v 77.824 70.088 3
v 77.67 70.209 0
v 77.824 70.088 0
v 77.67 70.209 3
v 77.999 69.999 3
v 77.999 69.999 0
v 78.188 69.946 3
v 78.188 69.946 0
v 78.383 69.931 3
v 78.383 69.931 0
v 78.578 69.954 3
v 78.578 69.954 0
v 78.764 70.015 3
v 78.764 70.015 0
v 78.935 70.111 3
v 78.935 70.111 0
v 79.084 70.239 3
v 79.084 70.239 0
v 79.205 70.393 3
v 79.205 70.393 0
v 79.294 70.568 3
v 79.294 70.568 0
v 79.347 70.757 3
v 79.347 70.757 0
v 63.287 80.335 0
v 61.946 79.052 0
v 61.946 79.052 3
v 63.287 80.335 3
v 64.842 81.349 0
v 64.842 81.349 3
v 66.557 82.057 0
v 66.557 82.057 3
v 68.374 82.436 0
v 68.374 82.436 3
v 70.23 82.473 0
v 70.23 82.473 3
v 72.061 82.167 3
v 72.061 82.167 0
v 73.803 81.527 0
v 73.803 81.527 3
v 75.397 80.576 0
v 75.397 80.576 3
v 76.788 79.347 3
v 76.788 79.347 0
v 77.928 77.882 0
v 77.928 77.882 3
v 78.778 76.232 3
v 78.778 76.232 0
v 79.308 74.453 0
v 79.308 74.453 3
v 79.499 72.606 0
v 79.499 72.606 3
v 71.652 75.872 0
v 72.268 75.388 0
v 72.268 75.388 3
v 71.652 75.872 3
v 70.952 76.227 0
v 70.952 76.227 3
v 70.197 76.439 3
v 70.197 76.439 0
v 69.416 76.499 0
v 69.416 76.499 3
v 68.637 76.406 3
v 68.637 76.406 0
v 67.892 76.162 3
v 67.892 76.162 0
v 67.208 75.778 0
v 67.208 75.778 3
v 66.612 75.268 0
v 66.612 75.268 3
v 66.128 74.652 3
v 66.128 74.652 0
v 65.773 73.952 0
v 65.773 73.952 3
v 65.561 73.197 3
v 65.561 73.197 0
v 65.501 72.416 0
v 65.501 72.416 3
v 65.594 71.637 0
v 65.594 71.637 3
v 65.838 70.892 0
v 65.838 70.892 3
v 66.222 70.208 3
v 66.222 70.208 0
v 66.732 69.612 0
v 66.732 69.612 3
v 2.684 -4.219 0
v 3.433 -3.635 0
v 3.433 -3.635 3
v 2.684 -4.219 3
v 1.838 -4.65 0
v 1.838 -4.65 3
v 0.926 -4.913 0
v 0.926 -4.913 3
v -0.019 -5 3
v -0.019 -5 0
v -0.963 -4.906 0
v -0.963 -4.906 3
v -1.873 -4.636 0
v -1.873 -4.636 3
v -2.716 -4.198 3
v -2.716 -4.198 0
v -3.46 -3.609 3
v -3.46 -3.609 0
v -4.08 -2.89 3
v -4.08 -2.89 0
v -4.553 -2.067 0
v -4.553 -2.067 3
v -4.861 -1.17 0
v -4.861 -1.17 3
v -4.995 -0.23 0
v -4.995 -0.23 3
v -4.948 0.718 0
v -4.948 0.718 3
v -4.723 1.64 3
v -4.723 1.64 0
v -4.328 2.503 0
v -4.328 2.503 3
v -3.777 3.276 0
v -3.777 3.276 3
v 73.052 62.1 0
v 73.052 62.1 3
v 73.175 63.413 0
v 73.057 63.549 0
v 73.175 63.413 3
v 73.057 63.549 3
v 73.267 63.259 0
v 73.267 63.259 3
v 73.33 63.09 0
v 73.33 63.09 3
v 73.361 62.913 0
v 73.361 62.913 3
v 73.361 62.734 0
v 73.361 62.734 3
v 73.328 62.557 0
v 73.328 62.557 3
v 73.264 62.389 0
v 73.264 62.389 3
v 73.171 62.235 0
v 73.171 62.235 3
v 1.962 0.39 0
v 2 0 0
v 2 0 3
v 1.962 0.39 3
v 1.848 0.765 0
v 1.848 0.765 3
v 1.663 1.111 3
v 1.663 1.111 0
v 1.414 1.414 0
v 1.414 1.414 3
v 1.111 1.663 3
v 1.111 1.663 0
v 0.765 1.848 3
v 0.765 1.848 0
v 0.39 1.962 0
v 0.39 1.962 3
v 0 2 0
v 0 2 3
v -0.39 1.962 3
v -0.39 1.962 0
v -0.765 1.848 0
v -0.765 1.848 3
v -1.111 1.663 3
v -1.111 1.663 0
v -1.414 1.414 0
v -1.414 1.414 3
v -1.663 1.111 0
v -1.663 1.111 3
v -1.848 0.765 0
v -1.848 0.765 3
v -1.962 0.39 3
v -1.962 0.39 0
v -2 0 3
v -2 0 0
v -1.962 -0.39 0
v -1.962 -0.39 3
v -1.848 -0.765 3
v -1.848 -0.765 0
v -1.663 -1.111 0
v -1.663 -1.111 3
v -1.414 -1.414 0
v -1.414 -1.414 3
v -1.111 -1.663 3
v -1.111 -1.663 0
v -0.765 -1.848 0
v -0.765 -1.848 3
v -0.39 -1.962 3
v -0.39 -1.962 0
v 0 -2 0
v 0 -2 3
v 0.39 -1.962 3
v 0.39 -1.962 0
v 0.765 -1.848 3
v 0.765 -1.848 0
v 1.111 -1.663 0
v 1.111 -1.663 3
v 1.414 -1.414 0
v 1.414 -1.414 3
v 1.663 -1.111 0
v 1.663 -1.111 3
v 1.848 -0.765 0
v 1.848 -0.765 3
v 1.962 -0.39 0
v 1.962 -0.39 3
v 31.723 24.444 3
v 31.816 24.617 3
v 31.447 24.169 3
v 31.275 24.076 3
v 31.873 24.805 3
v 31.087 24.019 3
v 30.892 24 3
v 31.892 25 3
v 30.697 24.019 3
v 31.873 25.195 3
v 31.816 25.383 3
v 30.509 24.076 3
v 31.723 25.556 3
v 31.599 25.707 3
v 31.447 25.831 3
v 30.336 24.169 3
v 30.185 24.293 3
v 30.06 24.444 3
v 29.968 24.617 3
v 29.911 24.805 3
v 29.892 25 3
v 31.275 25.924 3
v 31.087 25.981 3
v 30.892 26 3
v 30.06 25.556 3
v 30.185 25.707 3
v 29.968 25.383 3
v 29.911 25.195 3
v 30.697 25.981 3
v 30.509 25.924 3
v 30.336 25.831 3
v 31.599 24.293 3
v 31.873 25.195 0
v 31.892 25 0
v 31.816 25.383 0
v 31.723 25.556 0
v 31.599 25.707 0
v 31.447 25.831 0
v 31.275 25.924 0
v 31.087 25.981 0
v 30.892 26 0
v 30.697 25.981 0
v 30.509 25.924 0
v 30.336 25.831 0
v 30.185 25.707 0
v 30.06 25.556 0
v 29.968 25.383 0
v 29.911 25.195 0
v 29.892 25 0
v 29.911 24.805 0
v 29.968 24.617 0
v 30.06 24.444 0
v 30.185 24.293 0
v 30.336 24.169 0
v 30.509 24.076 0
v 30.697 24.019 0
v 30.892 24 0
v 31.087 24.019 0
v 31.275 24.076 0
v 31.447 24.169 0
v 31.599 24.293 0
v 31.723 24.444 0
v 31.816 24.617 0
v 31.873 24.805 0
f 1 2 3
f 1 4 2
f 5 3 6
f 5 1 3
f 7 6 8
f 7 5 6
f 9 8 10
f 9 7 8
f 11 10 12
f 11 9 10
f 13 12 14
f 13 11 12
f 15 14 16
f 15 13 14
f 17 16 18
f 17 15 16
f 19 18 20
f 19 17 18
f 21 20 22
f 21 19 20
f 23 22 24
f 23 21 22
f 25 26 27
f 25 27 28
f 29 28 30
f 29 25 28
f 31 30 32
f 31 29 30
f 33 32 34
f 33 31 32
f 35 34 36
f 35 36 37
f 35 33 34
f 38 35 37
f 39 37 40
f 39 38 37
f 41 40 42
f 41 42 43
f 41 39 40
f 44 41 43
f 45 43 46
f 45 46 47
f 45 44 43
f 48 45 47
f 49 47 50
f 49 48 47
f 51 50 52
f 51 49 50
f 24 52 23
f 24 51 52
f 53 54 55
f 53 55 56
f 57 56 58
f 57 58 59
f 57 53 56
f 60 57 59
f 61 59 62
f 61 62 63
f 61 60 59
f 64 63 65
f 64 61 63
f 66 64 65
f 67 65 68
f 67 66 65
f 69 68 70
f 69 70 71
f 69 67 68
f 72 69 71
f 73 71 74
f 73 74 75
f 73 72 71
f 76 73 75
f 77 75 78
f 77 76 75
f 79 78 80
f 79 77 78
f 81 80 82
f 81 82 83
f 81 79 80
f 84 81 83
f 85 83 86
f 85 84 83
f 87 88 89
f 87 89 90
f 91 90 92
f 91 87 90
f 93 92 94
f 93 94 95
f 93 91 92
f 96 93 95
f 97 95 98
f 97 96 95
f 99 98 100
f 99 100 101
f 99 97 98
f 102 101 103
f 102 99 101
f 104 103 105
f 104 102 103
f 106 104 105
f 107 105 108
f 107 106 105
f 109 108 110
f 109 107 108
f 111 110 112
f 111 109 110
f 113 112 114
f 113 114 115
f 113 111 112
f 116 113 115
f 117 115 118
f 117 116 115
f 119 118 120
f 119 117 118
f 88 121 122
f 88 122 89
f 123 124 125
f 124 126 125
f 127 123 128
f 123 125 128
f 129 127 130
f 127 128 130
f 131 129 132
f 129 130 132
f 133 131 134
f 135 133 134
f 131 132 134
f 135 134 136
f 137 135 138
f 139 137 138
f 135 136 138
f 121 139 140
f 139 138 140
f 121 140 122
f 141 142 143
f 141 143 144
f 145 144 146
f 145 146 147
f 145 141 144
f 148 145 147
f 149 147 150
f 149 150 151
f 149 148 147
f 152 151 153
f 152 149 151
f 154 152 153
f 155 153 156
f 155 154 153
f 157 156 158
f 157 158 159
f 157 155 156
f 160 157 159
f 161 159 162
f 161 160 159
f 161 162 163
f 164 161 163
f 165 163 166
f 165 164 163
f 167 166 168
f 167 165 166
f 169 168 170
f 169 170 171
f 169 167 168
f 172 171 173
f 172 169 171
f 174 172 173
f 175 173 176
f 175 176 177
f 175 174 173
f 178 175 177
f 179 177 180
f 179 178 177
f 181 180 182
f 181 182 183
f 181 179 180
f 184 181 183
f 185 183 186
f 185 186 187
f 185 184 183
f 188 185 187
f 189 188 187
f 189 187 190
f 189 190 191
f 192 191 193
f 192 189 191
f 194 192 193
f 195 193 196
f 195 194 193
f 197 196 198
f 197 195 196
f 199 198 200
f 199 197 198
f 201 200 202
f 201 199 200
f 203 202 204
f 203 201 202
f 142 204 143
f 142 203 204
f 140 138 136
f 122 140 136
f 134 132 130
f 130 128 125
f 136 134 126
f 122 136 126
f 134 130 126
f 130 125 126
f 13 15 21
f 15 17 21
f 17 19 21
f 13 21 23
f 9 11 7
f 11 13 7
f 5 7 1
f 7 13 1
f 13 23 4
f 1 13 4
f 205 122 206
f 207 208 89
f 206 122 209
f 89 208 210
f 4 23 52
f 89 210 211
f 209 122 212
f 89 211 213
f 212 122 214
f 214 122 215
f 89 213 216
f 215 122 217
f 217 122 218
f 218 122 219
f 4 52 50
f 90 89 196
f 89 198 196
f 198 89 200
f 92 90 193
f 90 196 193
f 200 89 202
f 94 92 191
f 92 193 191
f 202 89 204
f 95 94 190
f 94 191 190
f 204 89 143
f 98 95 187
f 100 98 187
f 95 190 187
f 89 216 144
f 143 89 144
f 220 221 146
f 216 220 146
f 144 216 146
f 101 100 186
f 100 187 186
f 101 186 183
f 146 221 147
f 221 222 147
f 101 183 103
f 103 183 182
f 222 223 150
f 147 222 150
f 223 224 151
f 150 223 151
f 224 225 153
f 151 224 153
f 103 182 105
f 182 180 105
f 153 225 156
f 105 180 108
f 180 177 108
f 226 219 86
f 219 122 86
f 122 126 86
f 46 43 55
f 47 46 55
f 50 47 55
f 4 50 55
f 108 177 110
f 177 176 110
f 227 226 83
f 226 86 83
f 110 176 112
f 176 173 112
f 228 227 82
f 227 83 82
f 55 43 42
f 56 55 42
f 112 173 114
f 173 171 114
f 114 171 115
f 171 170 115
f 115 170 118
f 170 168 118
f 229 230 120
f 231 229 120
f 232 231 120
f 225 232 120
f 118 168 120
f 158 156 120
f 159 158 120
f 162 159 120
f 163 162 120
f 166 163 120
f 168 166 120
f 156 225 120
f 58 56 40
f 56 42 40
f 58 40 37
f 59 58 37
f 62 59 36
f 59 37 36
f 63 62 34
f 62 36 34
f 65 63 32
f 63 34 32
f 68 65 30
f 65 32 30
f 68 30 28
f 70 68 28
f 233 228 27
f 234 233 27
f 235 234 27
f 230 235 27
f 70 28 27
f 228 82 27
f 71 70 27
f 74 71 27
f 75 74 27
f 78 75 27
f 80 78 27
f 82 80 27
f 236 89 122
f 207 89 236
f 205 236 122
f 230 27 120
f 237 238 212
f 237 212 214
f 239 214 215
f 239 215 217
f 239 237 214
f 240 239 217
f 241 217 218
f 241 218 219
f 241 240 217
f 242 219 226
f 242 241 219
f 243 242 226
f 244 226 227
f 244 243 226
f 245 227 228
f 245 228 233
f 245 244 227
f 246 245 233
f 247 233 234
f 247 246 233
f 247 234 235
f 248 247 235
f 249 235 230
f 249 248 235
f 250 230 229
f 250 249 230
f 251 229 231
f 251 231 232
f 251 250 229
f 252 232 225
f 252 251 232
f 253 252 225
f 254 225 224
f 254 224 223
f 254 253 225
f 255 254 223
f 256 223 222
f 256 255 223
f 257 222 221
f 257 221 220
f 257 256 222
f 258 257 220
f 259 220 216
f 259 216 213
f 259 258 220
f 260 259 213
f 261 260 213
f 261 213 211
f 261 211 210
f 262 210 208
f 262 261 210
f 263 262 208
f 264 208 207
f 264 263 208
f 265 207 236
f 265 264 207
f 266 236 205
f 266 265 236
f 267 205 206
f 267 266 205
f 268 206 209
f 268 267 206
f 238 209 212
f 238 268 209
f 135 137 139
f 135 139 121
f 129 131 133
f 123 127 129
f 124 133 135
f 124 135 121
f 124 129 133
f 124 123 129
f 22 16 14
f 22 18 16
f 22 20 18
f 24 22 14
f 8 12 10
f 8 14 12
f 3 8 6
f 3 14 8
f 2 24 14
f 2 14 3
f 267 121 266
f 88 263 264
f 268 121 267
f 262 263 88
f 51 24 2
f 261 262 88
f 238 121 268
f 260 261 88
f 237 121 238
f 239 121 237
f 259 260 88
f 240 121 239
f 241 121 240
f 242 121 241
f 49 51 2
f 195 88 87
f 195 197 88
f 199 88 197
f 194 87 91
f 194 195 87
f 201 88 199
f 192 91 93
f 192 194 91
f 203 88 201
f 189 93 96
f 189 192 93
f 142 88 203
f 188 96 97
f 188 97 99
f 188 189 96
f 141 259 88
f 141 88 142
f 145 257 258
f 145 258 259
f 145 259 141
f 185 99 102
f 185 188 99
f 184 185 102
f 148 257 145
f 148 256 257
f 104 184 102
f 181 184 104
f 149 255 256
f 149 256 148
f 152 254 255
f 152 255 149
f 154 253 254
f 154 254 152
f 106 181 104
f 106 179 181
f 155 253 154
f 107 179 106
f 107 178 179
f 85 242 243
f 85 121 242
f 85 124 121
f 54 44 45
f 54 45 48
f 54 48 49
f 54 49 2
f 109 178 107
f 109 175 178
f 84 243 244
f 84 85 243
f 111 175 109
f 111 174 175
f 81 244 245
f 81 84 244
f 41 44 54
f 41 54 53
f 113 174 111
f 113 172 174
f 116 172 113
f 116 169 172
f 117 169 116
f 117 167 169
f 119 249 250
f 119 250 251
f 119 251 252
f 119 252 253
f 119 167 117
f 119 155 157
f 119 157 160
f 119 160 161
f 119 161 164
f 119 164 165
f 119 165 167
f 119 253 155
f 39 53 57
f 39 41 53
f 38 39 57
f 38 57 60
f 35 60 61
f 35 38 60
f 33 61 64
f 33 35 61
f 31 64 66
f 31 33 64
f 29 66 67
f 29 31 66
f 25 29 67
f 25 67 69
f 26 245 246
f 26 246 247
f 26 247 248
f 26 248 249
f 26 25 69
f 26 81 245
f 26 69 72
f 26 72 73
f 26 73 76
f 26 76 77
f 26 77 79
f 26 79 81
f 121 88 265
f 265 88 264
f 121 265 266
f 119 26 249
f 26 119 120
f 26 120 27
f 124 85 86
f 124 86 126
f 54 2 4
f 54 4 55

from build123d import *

# Parameters (mm, degrees)
SKETCH_1_R      = 2
SKETCH_1_R_2    = 1
EXTRUDE_1_DEPTH = 3
FILLET_1_R      = 1


with BuildPart() as part:
    # 草图1 → 凸台-拉伸1 (new body)
    with BuildSketch(Plane.XY):
        with BuildLine():
            Line((66.731946056, 69.612461713), (73.815819619, 62.821713952))
            Line((73.815819619, 62.821713952), (3.432687046, -3.63547241))
            ThreePointArc((3.432687046, -3.63547241), (-3.460067431, -3.609422859), (-3.777206949, 3.276081144))
            Line((-3.777206949, 3.276081144), (61.945586102, 79.052162289))
            ThreePointArc((61.945586102, 79.052162289), (74.586475775, 81.109748207), (78.884235331, 69.045129923))
            Line((78.884235331, 69.045129923), (72.268053944, 75.387538287))
            ThreePointArc((72.268053944, 75.387538287), (66.612461713, 75.268053944), (66.731946056, 69.612461713))
        make_face()
        Circle(SKETCH_1_R, mode=Mode.SUBTRACT)
        with Locations((30.891832327, 25)):
            Circle(SKETCH_1_R_2, mode=Mode.SUBTRACT)
    extrude(amount=EXTRUDE_1_DEPTH)

    # 圆角1
    fillet_1_edges = [part.edges().sort_by_distance(p)[0] for p in [
        (73.815819619, 62.821713952, 1.5),
        (78.884235331, 69.045129923, 1.5),
    ]]
    fillet(fillet_1_edges, radius=FILLET_1_R)


solid = part.part
